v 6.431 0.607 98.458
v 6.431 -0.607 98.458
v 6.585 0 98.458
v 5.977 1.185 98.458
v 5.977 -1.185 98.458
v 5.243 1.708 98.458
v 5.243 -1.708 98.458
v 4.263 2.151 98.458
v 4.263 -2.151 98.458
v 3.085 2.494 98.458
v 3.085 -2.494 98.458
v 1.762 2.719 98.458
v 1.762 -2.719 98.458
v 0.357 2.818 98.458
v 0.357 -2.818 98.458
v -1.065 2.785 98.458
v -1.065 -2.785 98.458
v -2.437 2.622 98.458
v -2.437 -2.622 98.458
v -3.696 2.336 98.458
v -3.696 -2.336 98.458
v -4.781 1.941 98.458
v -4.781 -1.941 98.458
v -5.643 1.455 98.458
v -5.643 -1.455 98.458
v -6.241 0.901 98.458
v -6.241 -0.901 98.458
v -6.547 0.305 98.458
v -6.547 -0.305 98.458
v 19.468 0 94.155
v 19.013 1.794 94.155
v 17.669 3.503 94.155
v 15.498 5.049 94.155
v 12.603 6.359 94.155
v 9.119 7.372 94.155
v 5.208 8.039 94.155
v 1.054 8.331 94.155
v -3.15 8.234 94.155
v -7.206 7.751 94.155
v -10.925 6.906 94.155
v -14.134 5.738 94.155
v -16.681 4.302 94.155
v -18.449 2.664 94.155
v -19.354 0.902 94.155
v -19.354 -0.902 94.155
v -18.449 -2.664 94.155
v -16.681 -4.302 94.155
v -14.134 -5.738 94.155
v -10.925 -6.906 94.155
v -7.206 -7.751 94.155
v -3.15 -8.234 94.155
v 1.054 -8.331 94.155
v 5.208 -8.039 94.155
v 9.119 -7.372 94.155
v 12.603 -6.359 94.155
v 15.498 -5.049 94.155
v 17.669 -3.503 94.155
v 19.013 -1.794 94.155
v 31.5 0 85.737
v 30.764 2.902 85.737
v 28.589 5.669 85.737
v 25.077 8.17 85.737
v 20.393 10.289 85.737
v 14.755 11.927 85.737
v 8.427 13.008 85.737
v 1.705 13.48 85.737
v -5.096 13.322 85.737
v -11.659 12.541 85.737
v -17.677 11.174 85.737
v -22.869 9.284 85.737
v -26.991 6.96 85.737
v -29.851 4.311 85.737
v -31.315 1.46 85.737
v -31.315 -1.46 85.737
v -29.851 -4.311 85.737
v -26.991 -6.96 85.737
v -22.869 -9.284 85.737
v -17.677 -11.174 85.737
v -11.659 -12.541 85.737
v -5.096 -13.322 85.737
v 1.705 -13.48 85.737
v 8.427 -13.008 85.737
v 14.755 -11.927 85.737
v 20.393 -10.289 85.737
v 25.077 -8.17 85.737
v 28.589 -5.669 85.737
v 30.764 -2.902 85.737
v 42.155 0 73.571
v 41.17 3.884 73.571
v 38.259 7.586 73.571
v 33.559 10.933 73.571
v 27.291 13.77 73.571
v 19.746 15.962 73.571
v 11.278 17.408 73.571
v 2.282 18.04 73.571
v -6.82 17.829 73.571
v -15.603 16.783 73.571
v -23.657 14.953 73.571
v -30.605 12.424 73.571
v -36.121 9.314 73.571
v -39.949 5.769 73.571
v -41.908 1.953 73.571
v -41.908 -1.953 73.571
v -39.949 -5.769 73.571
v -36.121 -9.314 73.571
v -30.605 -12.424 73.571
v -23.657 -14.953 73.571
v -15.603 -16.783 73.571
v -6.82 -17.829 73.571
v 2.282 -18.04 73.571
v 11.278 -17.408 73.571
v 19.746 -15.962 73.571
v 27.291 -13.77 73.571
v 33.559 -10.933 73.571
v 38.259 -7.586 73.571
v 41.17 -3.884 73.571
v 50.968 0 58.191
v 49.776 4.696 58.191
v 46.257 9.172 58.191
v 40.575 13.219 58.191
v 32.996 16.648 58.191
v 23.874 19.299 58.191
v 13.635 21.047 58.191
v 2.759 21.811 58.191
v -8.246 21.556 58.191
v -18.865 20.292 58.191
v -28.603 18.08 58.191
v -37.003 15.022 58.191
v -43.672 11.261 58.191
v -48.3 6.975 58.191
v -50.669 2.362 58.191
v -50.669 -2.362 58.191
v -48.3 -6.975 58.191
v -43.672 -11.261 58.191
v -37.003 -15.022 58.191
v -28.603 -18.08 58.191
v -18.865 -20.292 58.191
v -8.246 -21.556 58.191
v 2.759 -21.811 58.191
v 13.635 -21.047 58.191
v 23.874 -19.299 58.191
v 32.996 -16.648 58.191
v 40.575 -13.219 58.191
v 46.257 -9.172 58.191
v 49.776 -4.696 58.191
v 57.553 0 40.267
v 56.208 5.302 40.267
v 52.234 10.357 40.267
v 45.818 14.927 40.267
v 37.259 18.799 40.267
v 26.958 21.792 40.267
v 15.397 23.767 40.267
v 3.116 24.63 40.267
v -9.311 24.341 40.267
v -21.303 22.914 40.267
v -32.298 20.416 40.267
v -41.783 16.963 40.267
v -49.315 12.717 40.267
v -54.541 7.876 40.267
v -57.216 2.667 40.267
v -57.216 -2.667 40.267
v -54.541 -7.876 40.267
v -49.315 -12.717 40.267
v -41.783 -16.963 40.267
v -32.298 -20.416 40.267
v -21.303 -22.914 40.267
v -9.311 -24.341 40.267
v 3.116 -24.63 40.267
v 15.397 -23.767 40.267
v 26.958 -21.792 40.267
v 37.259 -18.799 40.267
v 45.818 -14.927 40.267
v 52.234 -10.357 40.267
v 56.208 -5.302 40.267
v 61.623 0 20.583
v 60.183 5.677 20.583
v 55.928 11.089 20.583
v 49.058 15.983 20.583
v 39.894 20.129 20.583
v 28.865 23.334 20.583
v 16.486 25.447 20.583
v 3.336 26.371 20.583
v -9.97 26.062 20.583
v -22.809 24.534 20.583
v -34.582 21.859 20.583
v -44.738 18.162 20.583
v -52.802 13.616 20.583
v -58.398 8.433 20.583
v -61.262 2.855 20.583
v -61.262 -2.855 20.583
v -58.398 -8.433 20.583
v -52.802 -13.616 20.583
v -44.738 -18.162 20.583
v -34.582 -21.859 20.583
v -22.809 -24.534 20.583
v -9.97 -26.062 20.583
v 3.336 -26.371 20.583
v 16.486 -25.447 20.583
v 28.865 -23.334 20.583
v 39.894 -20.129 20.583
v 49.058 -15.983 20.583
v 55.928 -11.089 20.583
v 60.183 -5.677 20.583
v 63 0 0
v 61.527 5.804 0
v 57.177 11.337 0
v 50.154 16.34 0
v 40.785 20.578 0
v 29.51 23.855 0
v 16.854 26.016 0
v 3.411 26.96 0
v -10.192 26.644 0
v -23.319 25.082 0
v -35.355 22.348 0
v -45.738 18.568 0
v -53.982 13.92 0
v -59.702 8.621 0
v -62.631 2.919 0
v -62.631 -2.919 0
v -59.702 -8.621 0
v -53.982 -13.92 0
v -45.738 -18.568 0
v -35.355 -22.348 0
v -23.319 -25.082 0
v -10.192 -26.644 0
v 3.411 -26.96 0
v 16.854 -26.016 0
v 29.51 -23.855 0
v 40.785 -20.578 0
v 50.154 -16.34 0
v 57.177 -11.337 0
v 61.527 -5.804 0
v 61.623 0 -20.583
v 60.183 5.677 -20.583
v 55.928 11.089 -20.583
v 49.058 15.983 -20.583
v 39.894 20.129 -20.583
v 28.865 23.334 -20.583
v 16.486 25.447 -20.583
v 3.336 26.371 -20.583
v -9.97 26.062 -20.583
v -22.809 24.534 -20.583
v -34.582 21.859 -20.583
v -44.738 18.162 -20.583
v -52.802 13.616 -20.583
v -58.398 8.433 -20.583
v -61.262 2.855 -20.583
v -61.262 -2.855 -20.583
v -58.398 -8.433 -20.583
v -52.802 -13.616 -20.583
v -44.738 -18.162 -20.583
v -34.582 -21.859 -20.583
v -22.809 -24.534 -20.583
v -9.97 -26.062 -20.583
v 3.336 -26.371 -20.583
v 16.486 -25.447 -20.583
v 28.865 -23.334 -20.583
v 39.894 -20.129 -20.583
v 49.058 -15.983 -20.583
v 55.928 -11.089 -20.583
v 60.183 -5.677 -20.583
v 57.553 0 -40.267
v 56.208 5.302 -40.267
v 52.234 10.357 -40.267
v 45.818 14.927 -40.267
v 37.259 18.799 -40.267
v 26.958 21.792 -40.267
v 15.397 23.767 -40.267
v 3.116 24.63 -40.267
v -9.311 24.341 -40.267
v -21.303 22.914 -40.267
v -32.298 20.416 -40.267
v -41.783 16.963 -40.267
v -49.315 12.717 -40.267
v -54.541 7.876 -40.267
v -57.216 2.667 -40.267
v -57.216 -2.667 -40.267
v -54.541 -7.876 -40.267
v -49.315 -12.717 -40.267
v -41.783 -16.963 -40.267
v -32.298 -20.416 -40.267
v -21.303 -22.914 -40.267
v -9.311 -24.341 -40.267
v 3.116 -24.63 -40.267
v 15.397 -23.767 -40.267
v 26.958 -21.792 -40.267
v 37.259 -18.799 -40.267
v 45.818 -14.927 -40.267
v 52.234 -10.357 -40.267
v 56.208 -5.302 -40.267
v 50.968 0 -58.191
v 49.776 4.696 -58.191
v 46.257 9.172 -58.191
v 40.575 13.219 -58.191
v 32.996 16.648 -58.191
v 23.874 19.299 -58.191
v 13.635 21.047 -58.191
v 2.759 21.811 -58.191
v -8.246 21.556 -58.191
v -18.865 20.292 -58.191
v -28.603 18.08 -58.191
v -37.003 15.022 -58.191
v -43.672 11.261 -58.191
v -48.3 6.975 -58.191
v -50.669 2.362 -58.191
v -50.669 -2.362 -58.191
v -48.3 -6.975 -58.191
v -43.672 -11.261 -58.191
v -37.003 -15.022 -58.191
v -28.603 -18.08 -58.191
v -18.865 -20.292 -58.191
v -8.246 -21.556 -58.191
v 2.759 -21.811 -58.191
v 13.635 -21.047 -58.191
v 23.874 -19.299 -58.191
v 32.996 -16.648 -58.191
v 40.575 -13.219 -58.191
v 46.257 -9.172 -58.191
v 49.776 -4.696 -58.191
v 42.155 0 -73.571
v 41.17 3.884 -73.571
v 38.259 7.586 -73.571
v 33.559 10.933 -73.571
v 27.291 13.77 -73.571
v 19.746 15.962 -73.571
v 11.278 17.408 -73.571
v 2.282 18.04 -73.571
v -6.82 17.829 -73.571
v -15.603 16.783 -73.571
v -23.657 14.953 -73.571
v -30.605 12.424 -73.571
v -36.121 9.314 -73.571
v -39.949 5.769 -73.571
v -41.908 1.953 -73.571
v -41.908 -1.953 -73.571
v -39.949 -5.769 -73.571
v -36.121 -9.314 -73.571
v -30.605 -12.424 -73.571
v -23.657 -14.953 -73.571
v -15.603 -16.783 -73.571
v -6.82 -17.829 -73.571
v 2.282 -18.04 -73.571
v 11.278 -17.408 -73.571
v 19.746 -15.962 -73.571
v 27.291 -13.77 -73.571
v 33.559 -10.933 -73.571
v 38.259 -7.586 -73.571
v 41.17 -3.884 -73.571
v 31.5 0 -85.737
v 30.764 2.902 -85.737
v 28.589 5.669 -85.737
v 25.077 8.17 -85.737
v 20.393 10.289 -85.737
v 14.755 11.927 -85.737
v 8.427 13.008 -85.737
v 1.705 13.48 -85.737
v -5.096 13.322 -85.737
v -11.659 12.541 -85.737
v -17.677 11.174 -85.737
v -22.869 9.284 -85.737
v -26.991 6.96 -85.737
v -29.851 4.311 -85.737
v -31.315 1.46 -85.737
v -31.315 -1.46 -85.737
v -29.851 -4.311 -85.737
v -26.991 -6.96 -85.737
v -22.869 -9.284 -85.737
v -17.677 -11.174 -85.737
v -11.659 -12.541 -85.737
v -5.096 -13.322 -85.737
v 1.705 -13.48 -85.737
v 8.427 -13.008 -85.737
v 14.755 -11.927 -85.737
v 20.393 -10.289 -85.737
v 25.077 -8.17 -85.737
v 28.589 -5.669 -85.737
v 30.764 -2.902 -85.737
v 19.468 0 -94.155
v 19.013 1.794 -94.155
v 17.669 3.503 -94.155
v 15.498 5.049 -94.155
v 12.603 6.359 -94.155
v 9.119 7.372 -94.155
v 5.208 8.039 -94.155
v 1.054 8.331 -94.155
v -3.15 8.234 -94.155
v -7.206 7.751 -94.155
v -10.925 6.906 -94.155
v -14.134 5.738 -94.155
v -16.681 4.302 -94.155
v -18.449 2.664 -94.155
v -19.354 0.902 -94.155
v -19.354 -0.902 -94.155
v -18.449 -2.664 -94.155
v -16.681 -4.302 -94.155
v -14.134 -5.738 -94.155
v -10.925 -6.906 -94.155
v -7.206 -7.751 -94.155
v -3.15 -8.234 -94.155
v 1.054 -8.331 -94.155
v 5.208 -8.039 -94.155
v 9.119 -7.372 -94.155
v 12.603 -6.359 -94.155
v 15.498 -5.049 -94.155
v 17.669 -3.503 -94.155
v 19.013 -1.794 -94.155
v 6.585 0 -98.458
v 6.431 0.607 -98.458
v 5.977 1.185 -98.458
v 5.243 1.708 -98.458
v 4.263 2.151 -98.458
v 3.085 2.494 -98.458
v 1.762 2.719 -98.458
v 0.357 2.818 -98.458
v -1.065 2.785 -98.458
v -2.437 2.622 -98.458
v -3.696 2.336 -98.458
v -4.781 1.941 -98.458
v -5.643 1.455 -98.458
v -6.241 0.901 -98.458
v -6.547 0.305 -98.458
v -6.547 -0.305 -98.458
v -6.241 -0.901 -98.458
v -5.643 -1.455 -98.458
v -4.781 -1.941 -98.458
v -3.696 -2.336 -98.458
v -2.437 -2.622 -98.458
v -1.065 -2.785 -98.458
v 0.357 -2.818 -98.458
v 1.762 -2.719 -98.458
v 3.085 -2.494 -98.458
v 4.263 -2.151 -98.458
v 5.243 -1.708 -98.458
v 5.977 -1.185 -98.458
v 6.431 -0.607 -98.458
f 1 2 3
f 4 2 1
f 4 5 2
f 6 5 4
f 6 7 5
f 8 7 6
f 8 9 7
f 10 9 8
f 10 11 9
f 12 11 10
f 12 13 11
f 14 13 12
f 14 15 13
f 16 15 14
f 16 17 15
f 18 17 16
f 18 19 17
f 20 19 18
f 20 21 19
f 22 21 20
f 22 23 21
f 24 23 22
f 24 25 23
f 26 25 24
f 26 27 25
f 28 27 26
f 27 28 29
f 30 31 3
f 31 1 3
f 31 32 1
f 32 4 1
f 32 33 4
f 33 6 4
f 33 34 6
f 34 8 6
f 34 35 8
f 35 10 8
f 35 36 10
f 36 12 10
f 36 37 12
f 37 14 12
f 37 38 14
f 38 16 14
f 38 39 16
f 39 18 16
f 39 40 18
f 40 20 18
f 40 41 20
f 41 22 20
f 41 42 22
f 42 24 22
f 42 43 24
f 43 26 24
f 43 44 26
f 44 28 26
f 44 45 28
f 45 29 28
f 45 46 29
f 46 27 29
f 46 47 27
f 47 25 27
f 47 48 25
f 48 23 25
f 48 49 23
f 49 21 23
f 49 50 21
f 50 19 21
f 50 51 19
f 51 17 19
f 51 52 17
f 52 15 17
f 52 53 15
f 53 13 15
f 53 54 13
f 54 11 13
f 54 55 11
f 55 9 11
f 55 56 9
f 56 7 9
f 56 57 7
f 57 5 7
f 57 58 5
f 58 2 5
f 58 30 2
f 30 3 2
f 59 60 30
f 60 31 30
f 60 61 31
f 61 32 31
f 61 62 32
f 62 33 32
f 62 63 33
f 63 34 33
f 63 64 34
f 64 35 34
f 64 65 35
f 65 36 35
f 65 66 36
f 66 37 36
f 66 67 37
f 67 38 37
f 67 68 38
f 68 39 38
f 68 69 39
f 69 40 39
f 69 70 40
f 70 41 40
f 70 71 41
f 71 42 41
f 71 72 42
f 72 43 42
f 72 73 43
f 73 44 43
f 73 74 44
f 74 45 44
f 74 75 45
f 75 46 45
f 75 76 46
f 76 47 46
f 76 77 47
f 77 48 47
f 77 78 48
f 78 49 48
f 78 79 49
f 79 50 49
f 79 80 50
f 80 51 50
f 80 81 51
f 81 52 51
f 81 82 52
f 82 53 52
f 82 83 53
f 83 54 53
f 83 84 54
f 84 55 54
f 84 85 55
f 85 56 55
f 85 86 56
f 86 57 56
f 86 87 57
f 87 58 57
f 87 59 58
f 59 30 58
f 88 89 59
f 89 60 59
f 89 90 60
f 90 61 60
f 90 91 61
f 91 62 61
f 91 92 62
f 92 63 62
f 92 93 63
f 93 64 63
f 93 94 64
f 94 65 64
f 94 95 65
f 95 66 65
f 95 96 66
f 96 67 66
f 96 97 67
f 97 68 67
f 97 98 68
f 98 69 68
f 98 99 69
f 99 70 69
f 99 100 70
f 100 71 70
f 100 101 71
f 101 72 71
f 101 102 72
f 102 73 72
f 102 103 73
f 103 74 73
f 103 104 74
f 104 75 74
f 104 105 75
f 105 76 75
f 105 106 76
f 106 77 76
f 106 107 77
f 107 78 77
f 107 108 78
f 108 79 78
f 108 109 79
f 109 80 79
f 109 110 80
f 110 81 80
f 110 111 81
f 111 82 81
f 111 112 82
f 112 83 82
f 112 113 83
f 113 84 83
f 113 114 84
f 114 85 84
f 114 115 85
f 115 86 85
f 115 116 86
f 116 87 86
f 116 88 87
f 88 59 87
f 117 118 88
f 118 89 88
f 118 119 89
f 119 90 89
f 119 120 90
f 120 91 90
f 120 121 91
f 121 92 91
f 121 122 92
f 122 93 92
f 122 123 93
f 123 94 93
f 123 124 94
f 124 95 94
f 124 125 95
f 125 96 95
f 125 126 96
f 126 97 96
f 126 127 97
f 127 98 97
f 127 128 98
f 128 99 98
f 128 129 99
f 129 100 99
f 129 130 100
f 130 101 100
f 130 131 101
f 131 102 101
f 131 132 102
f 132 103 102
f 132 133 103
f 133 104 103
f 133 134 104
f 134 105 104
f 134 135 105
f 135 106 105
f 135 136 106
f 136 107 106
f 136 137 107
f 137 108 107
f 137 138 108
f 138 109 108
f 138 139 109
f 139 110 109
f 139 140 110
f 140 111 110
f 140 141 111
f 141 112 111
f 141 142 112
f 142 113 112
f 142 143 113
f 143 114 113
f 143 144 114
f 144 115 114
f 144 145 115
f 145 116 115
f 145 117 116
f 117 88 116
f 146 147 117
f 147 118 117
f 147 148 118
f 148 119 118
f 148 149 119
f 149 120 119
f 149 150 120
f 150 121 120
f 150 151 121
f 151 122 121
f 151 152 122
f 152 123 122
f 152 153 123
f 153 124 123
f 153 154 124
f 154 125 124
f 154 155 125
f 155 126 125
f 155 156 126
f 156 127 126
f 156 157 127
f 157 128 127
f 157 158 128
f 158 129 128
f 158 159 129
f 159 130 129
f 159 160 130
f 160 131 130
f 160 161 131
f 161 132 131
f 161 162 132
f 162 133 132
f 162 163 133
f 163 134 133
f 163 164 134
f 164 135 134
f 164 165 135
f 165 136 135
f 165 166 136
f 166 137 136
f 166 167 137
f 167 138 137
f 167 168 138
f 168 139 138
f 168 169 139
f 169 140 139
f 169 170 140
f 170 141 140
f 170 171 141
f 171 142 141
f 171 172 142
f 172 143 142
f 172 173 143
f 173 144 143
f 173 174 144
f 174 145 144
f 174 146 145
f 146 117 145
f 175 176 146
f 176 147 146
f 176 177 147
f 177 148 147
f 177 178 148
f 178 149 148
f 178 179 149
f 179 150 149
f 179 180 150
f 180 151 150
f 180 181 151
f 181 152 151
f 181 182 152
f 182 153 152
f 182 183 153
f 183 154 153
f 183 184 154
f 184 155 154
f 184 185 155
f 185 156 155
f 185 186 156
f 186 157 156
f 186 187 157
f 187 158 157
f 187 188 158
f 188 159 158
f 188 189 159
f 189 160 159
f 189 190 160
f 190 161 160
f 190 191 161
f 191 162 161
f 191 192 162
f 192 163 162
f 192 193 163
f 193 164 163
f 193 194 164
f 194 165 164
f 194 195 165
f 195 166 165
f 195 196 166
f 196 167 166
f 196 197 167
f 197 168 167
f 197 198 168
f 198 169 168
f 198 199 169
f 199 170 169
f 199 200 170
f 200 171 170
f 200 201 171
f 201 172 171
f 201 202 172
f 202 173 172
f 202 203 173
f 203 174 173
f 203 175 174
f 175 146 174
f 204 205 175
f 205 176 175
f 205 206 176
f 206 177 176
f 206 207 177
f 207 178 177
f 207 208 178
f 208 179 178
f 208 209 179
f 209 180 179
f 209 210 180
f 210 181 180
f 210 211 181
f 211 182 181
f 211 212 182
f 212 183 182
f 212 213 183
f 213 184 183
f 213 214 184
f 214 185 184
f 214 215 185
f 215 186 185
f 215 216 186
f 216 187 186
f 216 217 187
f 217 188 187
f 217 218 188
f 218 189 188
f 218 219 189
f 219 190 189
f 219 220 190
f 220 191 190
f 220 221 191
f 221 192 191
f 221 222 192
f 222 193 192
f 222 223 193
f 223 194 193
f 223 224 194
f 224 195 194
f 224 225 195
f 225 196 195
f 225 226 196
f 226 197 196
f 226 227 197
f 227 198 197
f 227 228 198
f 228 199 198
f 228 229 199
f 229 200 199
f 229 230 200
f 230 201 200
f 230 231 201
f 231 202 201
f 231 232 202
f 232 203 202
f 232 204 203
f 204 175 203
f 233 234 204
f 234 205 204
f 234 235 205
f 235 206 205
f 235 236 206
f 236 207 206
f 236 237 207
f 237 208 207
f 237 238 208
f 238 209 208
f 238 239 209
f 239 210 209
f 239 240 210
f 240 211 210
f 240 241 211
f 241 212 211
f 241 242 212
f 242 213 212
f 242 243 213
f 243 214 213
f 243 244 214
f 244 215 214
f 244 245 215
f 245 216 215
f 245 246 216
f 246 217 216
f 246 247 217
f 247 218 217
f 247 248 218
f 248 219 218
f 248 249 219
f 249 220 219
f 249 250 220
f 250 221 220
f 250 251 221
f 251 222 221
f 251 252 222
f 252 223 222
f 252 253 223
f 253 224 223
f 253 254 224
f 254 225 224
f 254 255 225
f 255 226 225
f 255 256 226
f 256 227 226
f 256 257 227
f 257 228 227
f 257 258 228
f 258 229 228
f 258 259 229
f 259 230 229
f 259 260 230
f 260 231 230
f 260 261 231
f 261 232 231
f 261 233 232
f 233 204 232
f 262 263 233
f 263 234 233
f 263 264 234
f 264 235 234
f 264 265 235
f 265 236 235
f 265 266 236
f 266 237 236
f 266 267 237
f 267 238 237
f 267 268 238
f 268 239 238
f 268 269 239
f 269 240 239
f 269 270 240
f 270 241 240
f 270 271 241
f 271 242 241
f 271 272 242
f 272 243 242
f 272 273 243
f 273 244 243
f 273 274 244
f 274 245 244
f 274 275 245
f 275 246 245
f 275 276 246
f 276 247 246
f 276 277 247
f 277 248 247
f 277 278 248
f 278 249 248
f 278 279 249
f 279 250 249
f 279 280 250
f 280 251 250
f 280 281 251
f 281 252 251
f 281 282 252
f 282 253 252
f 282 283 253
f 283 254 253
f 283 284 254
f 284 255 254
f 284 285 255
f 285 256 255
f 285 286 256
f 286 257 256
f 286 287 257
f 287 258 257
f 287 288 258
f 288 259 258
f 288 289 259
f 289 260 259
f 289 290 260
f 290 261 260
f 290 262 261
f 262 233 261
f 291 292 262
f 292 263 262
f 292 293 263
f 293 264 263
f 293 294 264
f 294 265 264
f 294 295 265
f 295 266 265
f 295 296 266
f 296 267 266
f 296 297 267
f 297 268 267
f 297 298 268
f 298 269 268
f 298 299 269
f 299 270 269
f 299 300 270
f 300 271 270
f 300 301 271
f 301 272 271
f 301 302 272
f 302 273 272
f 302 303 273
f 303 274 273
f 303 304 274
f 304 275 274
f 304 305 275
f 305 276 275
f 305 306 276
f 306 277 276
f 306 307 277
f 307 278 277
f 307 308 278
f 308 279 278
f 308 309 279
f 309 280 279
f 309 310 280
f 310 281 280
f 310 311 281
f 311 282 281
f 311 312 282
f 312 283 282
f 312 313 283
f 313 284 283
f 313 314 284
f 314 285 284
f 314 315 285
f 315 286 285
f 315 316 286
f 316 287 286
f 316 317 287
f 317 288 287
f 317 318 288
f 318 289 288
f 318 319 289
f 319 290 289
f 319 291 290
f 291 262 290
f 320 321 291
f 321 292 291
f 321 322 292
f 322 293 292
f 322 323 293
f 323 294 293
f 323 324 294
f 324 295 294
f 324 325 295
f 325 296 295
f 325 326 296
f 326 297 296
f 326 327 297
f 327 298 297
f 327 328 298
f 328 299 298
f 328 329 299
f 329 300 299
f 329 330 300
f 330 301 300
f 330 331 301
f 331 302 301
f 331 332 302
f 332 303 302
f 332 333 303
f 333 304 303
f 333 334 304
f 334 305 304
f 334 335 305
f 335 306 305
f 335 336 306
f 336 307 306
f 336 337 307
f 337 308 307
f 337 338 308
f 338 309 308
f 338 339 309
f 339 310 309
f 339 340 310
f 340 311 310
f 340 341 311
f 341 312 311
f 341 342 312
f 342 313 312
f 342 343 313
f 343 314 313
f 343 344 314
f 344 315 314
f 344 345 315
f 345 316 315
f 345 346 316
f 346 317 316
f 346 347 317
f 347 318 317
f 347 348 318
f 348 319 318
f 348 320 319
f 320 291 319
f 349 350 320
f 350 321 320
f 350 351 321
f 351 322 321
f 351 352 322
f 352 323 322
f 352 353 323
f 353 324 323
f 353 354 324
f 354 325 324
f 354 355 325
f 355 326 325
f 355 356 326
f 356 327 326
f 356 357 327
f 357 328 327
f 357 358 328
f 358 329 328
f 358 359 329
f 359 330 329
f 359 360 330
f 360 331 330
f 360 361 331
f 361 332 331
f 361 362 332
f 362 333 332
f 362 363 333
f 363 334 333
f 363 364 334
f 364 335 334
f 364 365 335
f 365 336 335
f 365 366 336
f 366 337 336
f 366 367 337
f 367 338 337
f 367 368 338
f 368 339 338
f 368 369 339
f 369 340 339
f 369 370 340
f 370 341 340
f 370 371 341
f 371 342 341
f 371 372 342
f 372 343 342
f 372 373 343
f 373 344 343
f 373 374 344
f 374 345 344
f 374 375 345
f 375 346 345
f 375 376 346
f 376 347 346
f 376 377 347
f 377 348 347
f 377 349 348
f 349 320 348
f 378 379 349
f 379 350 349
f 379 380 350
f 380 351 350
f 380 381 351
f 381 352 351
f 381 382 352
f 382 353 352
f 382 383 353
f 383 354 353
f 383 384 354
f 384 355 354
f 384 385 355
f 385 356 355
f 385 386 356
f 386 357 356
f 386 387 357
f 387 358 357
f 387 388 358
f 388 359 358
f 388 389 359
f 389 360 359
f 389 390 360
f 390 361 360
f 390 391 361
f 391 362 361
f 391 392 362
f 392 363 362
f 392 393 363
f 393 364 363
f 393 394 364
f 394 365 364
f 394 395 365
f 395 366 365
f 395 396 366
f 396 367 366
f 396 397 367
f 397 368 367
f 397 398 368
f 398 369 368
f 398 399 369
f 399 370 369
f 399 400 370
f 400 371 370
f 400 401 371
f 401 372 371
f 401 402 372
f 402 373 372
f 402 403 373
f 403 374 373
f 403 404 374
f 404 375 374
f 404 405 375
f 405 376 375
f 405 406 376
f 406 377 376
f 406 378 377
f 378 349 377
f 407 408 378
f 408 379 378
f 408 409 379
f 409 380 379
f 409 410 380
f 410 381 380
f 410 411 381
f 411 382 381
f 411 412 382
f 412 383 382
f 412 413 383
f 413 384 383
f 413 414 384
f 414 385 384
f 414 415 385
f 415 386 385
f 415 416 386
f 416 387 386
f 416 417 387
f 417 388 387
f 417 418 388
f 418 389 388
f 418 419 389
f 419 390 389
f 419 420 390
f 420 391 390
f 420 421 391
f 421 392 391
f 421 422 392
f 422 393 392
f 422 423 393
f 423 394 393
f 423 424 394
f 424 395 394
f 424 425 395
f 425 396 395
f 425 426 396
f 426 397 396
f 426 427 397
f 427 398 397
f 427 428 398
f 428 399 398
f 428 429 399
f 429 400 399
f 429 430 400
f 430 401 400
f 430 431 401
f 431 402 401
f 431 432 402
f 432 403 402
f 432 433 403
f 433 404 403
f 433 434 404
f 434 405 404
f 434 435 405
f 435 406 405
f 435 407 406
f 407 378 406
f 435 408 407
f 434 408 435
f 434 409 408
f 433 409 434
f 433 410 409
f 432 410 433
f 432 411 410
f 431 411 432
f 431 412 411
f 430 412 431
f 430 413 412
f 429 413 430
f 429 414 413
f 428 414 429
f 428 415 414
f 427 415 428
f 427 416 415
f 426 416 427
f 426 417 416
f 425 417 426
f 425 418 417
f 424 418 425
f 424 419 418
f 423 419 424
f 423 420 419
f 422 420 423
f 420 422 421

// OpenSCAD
// Generated by SolidPython 1.0.1 on 2020-07-29 00:46:47


scale(v = [7, 3, 11]) {
	sphere(r = 9);
}
/***********************************************
*********      SolidPython code:      **********
************************************************
 
# import packages: SolidPython
from solid import *
from solid.utils import *
from itertools import chain, combinations, permutations


class Resize:

    def __init__(self, scad_file):
        self.scad_file = scad_file
        #self.scad_file = import_scad(scad_file)
        # cone/cylinder param:
        self.r1 = 0
        self.r2 = 0
        self.h = 0
        # rectangular prism param:
        self.w = 0
        self.l = 0
        # ellipse param:
        self.r = 0

    # import OpenScad code (file name corresponds to shape)


    # classify shape + parameters
    def assign(self, param1, param2, param3):
        if self.scad_file == 'cone.scad':
            self.r1 = param1
            self.r2 = param2
            self.h = param3
        elif self.scad_file == 'cylinder.scad':
            self.r1 = param1
            self.r2 = param2
            self.h = param3
        elif self.scad_file == 'rectangularPrism.scad':
            self.h = param1
            self.l = param2
            self.w = param3
        else:
            self.r = param1
            self.h = param2

    # resize parameters
    def iterate(self):
        x = range(3, 20, 2)
        i = 1
        if self.scad_file == 'cone.scad':
            tempList = list(permutations(x, 2))
            for temp in tempList:
                param1 = temp[0]
                param2 = temp[1]
                filepath = 'produced_scad_files/' + 'cone' + str(param1) + '_' + str(param2) + '_' + '.scad'
                scad_render_to_file(cylinder(h=param1, r1=param2, r2=0), filepath)

        elif self.scad_file == 'cylinder.scad':
            tempList = list(permutations(x, 3))
            for temp in tempList:
                param1 = temp[0]
                param2 = temp[1]
                filepath = 'produced_scad_files/' + 'cylinder' + str(param1) + '_' + str(param2) + '_' + '.scad'
                scad_render_to_file(cylinder(h=param1, r1=param2, r2=param2), filepath)

        elif self.scad_file == 'rectangularPrism.scad':
            tempList = list(permutations(x, 3))
            for temp in tempList:
                param1 = temp[0]
                param2 = temp[1]
                param3 = temp[2]
                filepath = 'produced_scad_files/' + 'rectangularPrism' + str(param1) + '_' + str(param2) + '_' + str(
                    param3) + '.scad'
                scad_render_to_file(cube(size=(param1, param2, param3)), filepath)

        elif self.scad_file == 'ellipse.scad':
            tempList = list(permutations(x, 4))
            for temp in tempList:
                param1 = temp[0]
                param2 = temp[1]
                param3 = temp[2]
                param4 = temp[3]
                filepath = 'produced_scad_files/' + 'ellipse' + str(param1) + '_' + str(param2) + '_' + str(param3) + '_' + str(param4) + '.scad'
                scad_render_to_file(scale([param1, param2, param3])(sphere(r=param4)), filepath)

    def render_to_scadfile(self):
        scad_render_to_file(scad, 'example.scad') 
 
************************************************/
